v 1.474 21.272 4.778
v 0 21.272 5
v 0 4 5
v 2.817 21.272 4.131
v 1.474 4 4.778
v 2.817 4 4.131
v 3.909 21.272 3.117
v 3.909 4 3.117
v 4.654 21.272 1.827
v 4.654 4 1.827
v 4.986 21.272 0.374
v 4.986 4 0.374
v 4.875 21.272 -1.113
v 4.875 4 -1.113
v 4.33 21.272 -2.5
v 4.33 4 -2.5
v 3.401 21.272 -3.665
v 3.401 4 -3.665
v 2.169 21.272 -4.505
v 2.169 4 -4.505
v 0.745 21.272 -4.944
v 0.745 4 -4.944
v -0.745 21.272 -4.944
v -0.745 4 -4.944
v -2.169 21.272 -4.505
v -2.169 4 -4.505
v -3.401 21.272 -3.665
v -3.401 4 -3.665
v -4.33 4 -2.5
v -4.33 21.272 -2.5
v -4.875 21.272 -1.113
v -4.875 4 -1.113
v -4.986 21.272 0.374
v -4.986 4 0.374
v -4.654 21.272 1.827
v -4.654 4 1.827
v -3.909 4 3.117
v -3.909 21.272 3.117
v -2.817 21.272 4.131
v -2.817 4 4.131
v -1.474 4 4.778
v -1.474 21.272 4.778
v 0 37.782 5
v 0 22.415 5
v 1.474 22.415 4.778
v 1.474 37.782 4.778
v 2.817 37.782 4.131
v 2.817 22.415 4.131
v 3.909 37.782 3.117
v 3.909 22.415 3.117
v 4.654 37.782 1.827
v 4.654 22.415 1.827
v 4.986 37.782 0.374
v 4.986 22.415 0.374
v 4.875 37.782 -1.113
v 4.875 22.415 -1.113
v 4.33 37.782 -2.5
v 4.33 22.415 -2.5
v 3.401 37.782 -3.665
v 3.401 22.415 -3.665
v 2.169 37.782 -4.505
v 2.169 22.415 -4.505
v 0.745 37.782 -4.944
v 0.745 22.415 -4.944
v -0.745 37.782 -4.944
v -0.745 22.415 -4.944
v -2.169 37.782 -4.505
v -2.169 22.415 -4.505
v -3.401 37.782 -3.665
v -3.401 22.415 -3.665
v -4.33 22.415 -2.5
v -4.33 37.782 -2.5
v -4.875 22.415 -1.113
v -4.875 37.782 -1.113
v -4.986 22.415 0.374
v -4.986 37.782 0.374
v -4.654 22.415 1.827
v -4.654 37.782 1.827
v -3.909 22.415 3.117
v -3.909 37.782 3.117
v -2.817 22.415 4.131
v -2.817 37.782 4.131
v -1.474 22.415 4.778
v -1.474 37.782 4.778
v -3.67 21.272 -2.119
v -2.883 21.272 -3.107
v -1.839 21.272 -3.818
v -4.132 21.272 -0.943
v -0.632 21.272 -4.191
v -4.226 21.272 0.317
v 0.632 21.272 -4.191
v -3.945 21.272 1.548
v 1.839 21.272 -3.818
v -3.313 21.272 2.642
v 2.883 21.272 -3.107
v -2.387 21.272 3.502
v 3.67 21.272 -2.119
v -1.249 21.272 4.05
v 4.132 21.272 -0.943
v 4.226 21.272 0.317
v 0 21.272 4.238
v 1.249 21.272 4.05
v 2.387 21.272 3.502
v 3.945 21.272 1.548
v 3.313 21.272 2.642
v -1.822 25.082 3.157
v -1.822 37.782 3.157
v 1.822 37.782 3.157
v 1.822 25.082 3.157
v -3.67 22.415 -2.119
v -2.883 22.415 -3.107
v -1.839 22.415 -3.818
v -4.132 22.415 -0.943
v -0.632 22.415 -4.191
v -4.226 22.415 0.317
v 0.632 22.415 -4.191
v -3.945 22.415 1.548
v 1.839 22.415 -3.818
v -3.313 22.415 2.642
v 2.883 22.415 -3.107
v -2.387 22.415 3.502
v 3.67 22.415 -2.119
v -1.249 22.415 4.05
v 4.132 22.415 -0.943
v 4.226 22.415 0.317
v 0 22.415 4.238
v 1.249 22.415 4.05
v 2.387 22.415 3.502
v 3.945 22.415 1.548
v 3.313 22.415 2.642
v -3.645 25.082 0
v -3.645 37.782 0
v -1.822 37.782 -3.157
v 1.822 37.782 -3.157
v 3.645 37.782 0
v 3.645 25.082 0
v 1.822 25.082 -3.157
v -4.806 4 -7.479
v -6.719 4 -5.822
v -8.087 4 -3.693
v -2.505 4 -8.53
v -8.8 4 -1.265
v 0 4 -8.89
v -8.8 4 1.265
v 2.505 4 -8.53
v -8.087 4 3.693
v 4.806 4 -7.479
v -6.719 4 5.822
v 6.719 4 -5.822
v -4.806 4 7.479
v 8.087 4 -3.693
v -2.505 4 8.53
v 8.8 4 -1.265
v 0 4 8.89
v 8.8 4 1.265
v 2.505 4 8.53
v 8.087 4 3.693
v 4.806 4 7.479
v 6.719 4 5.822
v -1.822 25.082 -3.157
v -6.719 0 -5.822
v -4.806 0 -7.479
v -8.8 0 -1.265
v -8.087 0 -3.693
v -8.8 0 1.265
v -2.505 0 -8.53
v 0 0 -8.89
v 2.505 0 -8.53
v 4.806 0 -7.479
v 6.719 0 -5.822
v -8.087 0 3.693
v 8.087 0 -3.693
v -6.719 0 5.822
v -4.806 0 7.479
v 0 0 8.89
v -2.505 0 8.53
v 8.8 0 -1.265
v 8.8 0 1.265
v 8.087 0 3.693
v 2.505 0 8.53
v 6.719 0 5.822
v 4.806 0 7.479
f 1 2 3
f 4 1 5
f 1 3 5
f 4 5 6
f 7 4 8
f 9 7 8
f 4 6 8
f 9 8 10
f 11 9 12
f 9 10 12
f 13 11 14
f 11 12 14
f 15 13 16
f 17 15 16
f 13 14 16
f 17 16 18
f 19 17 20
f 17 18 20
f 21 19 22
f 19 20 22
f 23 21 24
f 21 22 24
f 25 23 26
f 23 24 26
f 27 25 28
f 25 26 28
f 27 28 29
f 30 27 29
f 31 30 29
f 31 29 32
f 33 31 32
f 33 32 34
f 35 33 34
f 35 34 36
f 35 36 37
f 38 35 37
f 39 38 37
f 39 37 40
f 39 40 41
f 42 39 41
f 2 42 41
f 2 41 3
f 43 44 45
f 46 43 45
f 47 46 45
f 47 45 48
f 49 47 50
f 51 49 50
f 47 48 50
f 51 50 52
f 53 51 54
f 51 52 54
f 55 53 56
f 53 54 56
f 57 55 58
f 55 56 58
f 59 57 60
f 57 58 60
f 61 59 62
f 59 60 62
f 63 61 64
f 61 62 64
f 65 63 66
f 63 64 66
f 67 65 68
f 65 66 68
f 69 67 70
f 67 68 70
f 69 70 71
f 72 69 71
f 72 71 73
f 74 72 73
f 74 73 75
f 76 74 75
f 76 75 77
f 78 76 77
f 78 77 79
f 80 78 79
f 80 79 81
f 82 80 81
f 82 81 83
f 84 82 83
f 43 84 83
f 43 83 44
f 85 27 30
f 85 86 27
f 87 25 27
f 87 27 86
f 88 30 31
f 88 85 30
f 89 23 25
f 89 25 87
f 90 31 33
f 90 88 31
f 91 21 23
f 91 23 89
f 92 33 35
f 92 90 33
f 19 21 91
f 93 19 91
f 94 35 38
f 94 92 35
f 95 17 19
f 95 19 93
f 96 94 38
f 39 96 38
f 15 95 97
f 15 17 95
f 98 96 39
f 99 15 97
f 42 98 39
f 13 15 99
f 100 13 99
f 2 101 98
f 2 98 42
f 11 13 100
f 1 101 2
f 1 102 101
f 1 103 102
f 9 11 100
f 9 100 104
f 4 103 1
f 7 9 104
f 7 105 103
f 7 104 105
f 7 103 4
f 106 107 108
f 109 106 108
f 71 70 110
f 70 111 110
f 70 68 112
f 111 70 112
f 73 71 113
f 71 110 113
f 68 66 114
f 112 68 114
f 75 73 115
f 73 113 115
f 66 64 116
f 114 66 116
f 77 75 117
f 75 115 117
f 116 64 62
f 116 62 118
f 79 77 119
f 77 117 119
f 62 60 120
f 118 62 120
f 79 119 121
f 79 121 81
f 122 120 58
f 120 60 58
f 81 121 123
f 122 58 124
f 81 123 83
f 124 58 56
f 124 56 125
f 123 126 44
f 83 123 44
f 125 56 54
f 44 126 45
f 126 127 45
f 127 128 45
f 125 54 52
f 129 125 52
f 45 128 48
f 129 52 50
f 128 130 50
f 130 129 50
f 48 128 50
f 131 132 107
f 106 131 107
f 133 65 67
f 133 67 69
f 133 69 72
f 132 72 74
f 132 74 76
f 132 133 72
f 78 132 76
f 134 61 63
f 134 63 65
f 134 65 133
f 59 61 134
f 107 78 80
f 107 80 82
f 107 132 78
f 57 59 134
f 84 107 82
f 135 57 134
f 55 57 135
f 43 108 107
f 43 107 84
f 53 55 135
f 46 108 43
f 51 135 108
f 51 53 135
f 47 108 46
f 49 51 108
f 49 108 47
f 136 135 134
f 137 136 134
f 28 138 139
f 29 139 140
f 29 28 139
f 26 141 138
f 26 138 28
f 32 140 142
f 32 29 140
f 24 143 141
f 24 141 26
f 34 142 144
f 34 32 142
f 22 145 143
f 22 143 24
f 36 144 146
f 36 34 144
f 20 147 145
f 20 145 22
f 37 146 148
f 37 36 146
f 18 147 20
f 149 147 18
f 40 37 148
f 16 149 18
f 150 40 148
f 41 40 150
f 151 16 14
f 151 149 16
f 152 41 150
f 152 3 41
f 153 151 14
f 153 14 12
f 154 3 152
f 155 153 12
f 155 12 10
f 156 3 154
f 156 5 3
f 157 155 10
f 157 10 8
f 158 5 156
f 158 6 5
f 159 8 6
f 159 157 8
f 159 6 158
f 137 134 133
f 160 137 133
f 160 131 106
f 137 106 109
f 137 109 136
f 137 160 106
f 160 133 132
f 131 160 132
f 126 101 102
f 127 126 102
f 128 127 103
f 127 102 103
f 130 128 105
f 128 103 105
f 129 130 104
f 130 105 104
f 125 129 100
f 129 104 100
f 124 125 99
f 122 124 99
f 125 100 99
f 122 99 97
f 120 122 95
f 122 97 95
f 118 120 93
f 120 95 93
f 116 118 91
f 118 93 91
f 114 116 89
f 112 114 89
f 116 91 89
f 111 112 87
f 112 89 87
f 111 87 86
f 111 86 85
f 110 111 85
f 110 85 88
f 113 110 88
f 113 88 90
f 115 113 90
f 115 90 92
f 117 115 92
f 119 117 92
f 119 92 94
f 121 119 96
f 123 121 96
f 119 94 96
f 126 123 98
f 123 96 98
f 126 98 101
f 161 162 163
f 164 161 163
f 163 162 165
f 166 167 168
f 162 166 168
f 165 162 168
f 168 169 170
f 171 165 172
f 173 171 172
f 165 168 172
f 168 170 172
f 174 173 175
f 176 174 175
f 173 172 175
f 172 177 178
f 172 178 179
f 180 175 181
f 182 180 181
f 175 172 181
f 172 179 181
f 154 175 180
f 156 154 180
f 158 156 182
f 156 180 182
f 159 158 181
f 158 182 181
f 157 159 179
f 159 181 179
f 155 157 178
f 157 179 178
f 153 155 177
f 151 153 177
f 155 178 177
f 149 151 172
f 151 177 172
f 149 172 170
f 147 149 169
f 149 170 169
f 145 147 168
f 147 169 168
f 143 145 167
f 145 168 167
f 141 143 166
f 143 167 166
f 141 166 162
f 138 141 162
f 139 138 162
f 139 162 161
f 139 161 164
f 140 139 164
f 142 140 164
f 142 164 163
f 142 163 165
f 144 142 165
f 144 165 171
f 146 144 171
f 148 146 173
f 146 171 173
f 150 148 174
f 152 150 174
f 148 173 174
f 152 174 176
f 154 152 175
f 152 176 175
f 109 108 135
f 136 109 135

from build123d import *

# Parameters (mm, degrees)
SKETCH1_R                                     = 8.89
TRAINGULAR_BASE_SIMPLIFIED_TO_CIRCLE_HE_DEPTH = 4
SKETCH2_R                                     = 5
DRIVE_SHAFT_DEPTH                             = 33.782
SKETCH4_R                                     = 5
SKETCH4_R_2                                   = 4.238
RETAINING_RING_SLOT_DEPTH                     = 1.143
HEX_SLOT_DEPTH                                = 12.7


with BuildPart() as part:
    # Sketch1 → Traingular base (simplified to circle here) (new body)
    with BuildSketch(Plane(origin=(0, 0, 0), x_dir=(1, 0, 0), z_dir=(0, 1, 0))):
        with Locations(Location((0, 0, 0), (0, 0, 270))):
            Circle(SKETCH1_R)
    extrude(amount=TRAINGULAR_BASE_SIMPLIFIED_TO_CIRCLE_HE_DEPTH)

    # Sketch2 → Drive shaft (add)
    with BuildSketch(Plane(origin=(0, 4, 0), x_dir=(1, 0, 0), z_dir=(0, 1, 0))):
        with Locations(Location((0, 0, 0), (0, 0, 270))):
            Circle(SKETCH2_R)
    extrude(amount=DRIVE_SHAFT_DEPTH)

    # Sketch4 → Retaining ring slot (cut)
    with BuildSketch(Plane(origin=(0, 21.272, 0), x_dir=(1, 0, 0), z_dir=(0, 1, 0))):
        with Locations(Location((0, 0, 0), (0, 0, 270))):
            Circle(SKETCH4_R)
        with Locations(Location((0, 0, 0), (0, 0, 270))):
            Circle(SKETCH4_R_2, mode=Mode.SUBTRACT)
    extrude(amount=RETAINING_RING_SLOT_DEPTH, mode=Mode.SUBTRACT)

    # Sketch5 → Hex slot (cut)
    with BuildSketch(Plane(origin=(0, 37.782, 0), x_dir=(1, 0, 0), z_dir=(0, 1, 0))):
        Polygon((3.6449, 0), (1.82245, 3.156575994), (-1.82245, 3.156575994), (-3.6449, 0), (-1.82245, -3.156575994), (1.82245, -3.156575994), align=None)
    extrude(amount=-HEX_SLOT_DEPTH, mode=Mode.SUBTRACT)


solid = part.part
